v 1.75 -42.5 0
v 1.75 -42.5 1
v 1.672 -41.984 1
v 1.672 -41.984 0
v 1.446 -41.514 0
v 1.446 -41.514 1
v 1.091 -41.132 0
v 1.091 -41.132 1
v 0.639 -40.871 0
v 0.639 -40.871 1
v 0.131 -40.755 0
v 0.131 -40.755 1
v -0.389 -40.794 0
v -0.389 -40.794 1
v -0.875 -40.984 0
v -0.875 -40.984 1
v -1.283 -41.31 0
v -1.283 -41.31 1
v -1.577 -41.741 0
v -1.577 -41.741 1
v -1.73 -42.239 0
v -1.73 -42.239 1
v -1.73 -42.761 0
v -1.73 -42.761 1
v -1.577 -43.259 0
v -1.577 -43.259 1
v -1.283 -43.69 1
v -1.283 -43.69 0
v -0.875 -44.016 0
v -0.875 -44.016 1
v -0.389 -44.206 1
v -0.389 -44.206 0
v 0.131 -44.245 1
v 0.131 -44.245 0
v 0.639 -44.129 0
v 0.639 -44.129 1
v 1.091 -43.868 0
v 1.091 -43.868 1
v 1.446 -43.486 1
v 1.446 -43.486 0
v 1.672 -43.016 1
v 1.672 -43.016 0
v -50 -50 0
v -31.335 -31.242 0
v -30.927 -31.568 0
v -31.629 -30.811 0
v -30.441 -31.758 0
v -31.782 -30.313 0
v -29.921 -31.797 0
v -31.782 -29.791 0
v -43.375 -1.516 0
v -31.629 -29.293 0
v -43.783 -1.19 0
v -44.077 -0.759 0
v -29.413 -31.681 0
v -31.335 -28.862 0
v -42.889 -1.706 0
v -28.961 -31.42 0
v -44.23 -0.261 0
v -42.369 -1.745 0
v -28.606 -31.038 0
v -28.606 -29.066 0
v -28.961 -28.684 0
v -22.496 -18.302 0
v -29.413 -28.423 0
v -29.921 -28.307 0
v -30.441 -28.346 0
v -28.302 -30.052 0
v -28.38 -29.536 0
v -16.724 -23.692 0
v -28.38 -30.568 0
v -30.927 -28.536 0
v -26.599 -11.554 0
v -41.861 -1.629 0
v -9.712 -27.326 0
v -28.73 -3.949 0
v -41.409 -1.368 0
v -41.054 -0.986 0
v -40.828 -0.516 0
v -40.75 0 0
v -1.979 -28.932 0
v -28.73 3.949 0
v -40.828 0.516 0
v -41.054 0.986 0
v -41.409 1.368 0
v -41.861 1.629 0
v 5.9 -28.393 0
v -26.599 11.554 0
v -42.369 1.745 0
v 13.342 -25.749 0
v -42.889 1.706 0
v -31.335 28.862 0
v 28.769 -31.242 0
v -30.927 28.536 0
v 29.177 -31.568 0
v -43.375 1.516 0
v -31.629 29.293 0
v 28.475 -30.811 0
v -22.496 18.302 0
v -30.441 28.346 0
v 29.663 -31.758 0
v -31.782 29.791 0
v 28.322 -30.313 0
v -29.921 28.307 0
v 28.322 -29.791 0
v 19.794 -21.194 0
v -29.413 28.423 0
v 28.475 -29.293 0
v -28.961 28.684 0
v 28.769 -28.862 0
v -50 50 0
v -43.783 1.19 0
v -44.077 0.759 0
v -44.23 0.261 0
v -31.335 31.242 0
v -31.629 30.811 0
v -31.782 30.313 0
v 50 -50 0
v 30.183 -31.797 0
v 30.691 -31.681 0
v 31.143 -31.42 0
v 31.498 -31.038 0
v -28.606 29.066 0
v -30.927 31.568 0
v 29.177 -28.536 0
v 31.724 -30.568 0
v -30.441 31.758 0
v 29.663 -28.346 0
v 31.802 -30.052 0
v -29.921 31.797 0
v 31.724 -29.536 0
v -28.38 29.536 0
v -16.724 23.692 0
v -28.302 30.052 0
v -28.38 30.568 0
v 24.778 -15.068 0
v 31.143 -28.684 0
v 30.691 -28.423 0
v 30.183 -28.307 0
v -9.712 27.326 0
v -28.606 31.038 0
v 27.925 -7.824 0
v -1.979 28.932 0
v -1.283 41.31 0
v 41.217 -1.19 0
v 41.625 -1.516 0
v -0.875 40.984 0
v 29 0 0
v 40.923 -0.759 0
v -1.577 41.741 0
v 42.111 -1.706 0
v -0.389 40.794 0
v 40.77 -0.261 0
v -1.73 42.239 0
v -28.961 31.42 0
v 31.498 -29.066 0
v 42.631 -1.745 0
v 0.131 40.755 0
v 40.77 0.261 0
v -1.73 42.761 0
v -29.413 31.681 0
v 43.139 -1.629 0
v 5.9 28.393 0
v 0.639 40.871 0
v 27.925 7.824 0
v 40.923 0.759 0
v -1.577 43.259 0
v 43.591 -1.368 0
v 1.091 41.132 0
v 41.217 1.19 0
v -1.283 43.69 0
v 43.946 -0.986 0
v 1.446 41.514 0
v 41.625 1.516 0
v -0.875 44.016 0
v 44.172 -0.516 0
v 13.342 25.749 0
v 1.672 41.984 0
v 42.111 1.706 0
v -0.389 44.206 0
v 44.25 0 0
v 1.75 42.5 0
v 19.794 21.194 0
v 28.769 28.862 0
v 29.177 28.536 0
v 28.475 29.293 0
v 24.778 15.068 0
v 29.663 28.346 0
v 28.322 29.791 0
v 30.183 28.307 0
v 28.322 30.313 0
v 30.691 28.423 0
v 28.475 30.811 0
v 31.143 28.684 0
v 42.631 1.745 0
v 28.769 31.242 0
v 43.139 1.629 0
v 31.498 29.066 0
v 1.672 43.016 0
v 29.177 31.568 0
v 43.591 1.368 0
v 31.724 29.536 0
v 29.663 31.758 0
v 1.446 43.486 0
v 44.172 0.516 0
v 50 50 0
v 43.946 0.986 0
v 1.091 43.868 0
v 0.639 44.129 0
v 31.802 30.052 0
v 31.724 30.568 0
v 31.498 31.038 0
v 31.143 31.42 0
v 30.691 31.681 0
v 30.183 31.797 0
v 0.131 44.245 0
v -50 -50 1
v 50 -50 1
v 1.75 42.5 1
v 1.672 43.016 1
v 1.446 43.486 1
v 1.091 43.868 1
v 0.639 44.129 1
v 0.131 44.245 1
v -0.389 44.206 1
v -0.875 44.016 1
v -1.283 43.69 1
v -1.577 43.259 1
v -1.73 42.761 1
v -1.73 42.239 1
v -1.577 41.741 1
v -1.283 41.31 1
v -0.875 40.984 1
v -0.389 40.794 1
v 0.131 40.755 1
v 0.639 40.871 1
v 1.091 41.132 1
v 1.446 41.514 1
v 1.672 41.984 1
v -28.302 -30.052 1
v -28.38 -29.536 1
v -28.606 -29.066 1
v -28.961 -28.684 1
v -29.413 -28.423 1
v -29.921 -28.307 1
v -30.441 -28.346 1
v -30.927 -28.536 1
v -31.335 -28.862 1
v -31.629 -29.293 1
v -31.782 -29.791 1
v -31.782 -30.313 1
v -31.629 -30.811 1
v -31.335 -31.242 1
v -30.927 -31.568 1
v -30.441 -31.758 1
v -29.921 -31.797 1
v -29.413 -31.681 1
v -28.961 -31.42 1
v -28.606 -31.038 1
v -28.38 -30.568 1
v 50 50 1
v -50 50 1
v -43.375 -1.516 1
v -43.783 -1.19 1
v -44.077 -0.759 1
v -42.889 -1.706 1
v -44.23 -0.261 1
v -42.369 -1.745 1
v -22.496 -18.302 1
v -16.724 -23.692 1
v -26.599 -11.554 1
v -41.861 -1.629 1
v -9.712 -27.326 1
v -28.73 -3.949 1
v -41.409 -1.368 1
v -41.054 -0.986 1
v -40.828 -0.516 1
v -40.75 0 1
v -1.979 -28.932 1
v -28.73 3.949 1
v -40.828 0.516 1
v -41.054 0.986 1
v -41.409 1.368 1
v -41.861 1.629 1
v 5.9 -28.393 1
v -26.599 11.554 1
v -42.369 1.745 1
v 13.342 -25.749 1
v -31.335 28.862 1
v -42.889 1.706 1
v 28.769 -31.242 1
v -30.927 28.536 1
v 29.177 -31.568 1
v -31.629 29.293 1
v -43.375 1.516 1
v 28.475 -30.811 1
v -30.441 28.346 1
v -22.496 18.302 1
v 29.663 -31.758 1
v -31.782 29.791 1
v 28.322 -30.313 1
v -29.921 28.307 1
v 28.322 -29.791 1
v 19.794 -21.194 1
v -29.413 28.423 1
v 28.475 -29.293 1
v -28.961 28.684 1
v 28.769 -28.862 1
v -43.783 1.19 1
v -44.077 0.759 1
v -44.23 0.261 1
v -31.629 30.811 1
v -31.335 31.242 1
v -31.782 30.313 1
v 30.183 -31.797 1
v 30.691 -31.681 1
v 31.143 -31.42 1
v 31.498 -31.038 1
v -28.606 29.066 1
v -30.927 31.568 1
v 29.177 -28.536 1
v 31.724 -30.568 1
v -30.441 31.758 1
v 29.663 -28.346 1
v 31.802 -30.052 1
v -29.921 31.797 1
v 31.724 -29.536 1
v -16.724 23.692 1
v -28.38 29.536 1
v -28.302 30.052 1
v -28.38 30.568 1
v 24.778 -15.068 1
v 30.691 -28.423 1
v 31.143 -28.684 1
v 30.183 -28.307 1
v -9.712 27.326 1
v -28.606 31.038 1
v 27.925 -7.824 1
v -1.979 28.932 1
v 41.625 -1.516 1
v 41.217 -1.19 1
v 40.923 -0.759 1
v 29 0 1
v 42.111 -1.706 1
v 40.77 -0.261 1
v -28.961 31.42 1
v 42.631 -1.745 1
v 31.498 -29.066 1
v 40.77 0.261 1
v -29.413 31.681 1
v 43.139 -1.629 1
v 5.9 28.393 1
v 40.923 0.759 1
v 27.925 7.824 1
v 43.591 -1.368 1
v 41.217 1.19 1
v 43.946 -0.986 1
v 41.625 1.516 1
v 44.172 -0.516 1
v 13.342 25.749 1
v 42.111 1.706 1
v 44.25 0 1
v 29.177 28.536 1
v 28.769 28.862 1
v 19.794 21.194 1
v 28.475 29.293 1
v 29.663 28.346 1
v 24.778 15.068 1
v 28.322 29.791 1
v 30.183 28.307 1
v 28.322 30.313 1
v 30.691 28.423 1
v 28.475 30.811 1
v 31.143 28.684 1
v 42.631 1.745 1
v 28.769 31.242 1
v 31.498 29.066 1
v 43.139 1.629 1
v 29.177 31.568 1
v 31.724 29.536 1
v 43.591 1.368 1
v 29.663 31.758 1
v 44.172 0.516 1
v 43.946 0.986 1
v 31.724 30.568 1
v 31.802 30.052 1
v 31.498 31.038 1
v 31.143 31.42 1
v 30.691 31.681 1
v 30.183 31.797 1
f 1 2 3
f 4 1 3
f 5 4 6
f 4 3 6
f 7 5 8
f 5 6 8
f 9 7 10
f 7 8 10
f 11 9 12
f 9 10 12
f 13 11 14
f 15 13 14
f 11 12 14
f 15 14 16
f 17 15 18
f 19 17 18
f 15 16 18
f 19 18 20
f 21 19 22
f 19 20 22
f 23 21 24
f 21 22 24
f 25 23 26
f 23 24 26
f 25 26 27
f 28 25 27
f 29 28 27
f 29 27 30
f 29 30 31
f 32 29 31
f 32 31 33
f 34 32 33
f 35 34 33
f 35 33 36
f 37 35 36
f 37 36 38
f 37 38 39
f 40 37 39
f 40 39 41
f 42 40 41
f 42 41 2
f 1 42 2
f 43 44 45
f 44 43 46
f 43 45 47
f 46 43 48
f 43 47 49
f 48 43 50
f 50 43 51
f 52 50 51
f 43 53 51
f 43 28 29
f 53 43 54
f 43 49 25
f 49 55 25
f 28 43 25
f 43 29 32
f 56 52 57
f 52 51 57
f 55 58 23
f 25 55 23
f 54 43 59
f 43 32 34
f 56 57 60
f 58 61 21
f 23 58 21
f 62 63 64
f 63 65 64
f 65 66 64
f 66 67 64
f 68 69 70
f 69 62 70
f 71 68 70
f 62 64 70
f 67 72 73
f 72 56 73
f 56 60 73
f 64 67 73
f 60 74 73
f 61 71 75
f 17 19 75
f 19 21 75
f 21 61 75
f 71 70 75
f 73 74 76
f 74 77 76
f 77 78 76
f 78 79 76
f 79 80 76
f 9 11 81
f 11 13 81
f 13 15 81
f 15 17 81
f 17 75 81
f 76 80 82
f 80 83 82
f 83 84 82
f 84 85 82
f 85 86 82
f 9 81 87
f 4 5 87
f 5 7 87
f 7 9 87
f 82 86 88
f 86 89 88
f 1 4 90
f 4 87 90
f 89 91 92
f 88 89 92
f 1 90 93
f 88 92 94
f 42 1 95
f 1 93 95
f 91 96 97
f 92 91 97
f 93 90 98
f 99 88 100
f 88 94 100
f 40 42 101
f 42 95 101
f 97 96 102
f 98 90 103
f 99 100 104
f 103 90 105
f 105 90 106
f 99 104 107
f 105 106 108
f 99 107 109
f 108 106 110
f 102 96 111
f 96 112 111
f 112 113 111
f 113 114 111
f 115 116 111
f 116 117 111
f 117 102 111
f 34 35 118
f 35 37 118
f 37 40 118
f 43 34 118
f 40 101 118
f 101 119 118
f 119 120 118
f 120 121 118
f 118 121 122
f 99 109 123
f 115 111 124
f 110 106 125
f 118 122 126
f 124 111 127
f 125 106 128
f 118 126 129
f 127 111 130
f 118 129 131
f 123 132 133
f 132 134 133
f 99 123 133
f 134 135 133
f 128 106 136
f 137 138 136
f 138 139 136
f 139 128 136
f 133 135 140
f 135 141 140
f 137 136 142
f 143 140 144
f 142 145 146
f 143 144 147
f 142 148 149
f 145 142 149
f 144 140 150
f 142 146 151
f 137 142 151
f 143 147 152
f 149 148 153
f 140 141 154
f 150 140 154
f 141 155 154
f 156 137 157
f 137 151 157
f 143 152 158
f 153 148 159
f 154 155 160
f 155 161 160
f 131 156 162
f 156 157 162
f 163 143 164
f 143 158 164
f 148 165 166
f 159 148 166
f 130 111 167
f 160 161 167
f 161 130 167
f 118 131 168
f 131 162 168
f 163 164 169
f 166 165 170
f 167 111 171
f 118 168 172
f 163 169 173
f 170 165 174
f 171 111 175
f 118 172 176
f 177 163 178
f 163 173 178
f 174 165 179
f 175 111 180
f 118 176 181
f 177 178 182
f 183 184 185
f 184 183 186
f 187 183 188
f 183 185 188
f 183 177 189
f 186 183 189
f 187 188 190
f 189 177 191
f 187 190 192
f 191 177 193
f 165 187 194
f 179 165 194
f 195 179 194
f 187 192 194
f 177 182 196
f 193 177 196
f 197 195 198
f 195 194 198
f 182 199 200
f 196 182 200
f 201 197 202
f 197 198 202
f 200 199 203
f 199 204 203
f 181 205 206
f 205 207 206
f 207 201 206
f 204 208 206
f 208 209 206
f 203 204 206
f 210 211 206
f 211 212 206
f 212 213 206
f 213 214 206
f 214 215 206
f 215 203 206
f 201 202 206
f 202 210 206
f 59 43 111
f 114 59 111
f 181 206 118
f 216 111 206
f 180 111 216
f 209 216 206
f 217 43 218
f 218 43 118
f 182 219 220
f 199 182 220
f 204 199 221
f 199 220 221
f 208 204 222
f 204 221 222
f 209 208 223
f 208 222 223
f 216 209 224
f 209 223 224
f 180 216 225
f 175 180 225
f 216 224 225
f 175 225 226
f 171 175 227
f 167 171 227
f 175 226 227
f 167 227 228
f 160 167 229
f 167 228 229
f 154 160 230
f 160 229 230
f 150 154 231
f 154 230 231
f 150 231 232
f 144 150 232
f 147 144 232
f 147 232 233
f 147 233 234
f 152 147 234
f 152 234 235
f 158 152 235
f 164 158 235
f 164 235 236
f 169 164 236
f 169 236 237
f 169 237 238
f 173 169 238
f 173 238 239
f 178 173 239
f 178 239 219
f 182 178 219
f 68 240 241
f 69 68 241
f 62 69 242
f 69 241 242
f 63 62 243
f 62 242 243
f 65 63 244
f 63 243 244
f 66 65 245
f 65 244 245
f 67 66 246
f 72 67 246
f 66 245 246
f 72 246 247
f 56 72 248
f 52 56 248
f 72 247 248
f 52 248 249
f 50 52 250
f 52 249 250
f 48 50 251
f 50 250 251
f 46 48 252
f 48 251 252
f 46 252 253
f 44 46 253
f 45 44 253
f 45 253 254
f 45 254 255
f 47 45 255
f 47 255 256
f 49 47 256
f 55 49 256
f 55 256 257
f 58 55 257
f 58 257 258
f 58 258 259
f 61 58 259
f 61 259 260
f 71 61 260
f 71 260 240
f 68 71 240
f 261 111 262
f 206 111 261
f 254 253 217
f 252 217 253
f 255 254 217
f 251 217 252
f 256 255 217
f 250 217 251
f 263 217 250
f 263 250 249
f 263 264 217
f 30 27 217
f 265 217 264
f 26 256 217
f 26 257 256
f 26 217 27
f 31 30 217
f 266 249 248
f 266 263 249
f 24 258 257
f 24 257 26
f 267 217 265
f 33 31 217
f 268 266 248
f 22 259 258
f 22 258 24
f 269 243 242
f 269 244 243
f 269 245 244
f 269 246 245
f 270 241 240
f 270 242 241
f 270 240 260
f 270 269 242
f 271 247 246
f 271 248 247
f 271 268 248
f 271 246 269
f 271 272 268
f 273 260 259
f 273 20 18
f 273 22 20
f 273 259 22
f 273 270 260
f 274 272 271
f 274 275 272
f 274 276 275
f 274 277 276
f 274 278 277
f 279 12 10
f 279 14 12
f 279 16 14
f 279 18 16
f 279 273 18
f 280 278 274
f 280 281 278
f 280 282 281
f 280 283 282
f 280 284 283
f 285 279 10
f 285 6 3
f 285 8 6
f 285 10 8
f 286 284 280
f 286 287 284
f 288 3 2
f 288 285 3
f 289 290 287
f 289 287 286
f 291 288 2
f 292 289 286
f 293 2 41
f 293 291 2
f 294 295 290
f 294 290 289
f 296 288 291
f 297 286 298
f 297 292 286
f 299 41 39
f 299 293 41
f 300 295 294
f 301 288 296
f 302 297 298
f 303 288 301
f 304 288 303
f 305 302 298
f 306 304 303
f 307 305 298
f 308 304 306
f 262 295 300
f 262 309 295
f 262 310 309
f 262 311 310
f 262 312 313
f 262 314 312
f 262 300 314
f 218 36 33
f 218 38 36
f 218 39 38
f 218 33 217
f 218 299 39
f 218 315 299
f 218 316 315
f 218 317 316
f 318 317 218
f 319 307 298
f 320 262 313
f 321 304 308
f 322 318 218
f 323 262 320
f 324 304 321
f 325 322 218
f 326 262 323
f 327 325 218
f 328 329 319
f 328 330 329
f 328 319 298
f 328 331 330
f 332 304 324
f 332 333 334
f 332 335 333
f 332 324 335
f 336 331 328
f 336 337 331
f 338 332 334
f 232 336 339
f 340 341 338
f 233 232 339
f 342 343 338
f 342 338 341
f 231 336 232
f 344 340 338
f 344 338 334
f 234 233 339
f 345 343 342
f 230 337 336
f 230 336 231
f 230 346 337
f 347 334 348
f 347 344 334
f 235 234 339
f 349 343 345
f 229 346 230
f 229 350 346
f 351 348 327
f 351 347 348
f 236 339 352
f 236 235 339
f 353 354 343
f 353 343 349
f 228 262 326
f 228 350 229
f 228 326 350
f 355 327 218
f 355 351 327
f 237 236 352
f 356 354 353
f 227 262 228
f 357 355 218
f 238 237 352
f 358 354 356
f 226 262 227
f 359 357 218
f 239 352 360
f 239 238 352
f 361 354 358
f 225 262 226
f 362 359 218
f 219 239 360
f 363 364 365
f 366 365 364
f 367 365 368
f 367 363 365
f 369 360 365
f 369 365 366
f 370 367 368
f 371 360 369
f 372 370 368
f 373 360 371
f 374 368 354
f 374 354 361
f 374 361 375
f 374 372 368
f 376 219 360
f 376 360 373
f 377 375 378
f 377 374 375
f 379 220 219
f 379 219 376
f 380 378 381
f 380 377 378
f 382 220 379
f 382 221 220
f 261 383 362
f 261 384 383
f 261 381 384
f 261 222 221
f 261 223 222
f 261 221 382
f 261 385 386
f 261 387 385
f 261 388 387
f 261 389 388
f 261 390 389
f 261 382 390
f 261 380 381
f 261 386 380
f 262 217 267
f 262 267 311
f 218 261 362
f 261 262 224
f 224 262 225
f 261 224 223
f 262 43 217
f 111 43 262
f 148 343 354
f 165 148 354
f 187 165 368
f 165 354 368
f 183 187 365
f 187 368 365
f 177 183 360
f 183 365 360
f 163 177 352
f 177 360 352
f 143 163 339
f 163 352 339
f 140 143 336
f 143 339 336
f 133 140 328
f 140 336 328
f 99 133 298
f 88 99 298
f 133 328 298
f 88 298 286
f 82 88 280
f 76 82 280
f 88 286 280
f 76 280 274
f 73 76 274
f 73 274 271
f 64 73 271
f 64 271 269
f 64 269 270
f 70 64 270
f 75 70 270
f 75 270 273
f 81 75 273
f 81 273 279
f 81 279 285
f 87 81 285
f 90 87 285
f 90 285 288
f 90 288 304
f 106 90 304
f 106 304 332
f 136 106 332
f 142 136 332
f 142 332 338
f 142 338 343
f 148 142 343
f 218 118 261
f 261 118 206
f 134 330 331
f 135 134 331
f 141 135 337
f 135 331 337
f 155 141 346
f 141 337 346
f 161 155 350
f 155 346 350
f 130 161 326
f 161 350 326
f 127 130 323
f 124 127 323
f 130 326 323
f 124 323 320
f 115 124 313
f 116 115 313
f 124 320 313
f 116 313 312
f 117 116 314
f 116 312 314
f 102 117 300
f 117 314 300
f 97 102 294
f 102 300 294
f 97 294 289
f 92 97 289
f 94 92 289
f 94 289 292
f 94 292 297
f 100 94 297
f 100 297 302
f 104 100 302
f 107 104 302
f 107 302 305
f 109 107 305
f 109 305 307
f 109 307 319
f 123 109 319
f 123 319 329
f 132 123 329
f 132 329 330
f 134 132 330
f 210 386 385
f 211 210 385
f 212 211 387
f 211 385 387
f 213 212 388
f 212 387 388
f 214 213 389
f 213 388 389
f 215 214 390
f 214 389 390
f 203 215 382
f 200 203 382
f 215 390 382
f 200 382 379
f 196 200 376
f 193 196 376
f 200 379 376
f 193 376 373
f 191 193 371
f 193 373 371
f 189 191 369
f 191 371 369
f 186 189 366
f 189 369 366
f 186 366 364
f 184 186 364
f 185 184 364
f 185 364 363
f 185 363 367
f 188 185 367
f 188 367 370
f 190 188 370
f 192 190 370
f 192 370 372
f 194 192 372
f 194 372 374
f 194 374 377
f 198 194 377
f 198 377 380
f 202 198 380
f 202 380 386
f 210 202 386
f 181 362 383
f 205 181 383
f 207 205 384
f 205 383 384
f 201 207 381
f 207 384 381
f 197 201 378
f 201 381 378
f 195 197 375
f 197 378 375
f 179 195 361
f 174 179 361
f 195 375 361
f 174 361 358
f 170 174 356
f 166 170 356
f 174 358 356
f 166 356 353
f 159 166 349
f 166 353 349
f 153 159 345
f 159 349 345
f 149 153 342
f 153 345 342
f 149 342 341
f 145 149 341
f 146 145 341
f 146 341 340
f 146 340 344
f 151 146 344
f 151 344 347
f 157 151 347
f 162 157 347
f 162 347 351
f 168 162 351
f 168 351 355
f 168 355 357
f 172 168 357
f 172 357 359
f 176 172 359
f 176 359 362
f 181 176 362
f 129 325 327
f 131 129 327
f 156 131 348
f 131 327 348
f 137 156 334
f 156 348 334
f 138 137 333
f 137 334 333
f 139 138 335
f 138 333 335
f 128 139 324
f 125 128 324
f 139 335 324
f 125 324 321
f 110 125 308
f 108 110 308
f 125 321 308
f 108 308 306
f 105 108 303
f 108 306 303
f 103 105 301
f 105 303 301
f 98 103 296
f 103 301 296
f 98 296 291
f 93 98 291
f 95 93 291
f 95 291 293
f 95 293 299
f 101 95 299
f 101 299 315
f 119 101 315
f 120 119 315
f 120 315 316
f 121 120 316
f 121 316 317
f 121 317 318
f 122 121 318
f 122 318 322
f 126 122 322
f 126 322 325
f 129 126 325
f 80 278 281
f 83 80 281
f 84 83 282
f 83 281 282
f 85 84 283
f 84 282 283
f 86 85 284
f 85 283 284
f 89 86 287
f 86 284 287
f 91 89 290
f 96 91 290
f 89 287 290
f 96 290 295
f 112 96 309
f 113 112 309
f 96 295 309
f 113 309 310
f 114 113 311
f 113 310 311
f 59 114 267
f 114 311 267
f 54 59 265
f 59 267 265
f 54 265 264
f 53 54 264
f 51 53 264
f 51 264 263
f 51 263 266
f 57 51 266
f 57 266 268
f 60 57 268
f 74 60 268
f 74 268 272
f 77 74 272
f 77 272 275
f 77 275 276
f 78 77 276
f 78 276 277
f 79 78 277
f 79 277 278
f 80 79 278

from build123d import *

# Parameters (mm, degrees)
SKETCH_1_W          = 100
SKETCH_1_H          = 100
EXTRUDE_1_DEPTH     = 1
SKETCH_2_R          = 1.75
CUT_EXTRUDE_1_DEPTH = 4
SKETCH_3_R          = 29
CUT_EXTRUDE_2_DEPTH = 4


with BuildPart() as part:
    # 草图1 → 凸台-拉伸1 (new body)
    with BuildSketch(Plane.XY):
        Rectangle(SKETCH_1_W, SKETCH_1_H)
    extrude(amount=EXTRUDE_1_DEPTH)

    # 草图2 → 切除-拉伸1 (cut)
    with BuildSketch(Plane.XY.offset(1)):
        with Locations((-42.5, 0)):
            Circle(SKETCH_2_R)
        with Locations((-30.0520382, 30.0520382)):
            Circle(SKETCH_2_R)
        with Locations((0, 42.5)):
            Circle(SKETCH_2_R)
        with Locations((30.0520382, 30.0520382)):
            Circle(SKETCH_2_R)
        with Locations((42.5, 0)):
            Circle(SKETCH_2_R)
        with Locations((30.0520382, -30.0520382)):
            Circle(SKETCH_2_R)
        with Locations((0, -42.5)):
            Circle(SKETCH_2_R)
        with Locations((-30.0520382, -30.0520382)):
            Circle(SKETCH_2_R)
    extrude(amount=-CUT_EXTRUDE_1_DEPTH, mode=Mode.SUBTRACT)

    # 草图3 → 切除-拉伸2 (cut)
    with BuildSketch(Plane.XY.offset(1)):
        Circle(SKETCH_3_R)
    extrude(amount=-CUT_EXTRUDE_2_DEPTH, mode=Mode.SUBTRACT)


solid = part.part
